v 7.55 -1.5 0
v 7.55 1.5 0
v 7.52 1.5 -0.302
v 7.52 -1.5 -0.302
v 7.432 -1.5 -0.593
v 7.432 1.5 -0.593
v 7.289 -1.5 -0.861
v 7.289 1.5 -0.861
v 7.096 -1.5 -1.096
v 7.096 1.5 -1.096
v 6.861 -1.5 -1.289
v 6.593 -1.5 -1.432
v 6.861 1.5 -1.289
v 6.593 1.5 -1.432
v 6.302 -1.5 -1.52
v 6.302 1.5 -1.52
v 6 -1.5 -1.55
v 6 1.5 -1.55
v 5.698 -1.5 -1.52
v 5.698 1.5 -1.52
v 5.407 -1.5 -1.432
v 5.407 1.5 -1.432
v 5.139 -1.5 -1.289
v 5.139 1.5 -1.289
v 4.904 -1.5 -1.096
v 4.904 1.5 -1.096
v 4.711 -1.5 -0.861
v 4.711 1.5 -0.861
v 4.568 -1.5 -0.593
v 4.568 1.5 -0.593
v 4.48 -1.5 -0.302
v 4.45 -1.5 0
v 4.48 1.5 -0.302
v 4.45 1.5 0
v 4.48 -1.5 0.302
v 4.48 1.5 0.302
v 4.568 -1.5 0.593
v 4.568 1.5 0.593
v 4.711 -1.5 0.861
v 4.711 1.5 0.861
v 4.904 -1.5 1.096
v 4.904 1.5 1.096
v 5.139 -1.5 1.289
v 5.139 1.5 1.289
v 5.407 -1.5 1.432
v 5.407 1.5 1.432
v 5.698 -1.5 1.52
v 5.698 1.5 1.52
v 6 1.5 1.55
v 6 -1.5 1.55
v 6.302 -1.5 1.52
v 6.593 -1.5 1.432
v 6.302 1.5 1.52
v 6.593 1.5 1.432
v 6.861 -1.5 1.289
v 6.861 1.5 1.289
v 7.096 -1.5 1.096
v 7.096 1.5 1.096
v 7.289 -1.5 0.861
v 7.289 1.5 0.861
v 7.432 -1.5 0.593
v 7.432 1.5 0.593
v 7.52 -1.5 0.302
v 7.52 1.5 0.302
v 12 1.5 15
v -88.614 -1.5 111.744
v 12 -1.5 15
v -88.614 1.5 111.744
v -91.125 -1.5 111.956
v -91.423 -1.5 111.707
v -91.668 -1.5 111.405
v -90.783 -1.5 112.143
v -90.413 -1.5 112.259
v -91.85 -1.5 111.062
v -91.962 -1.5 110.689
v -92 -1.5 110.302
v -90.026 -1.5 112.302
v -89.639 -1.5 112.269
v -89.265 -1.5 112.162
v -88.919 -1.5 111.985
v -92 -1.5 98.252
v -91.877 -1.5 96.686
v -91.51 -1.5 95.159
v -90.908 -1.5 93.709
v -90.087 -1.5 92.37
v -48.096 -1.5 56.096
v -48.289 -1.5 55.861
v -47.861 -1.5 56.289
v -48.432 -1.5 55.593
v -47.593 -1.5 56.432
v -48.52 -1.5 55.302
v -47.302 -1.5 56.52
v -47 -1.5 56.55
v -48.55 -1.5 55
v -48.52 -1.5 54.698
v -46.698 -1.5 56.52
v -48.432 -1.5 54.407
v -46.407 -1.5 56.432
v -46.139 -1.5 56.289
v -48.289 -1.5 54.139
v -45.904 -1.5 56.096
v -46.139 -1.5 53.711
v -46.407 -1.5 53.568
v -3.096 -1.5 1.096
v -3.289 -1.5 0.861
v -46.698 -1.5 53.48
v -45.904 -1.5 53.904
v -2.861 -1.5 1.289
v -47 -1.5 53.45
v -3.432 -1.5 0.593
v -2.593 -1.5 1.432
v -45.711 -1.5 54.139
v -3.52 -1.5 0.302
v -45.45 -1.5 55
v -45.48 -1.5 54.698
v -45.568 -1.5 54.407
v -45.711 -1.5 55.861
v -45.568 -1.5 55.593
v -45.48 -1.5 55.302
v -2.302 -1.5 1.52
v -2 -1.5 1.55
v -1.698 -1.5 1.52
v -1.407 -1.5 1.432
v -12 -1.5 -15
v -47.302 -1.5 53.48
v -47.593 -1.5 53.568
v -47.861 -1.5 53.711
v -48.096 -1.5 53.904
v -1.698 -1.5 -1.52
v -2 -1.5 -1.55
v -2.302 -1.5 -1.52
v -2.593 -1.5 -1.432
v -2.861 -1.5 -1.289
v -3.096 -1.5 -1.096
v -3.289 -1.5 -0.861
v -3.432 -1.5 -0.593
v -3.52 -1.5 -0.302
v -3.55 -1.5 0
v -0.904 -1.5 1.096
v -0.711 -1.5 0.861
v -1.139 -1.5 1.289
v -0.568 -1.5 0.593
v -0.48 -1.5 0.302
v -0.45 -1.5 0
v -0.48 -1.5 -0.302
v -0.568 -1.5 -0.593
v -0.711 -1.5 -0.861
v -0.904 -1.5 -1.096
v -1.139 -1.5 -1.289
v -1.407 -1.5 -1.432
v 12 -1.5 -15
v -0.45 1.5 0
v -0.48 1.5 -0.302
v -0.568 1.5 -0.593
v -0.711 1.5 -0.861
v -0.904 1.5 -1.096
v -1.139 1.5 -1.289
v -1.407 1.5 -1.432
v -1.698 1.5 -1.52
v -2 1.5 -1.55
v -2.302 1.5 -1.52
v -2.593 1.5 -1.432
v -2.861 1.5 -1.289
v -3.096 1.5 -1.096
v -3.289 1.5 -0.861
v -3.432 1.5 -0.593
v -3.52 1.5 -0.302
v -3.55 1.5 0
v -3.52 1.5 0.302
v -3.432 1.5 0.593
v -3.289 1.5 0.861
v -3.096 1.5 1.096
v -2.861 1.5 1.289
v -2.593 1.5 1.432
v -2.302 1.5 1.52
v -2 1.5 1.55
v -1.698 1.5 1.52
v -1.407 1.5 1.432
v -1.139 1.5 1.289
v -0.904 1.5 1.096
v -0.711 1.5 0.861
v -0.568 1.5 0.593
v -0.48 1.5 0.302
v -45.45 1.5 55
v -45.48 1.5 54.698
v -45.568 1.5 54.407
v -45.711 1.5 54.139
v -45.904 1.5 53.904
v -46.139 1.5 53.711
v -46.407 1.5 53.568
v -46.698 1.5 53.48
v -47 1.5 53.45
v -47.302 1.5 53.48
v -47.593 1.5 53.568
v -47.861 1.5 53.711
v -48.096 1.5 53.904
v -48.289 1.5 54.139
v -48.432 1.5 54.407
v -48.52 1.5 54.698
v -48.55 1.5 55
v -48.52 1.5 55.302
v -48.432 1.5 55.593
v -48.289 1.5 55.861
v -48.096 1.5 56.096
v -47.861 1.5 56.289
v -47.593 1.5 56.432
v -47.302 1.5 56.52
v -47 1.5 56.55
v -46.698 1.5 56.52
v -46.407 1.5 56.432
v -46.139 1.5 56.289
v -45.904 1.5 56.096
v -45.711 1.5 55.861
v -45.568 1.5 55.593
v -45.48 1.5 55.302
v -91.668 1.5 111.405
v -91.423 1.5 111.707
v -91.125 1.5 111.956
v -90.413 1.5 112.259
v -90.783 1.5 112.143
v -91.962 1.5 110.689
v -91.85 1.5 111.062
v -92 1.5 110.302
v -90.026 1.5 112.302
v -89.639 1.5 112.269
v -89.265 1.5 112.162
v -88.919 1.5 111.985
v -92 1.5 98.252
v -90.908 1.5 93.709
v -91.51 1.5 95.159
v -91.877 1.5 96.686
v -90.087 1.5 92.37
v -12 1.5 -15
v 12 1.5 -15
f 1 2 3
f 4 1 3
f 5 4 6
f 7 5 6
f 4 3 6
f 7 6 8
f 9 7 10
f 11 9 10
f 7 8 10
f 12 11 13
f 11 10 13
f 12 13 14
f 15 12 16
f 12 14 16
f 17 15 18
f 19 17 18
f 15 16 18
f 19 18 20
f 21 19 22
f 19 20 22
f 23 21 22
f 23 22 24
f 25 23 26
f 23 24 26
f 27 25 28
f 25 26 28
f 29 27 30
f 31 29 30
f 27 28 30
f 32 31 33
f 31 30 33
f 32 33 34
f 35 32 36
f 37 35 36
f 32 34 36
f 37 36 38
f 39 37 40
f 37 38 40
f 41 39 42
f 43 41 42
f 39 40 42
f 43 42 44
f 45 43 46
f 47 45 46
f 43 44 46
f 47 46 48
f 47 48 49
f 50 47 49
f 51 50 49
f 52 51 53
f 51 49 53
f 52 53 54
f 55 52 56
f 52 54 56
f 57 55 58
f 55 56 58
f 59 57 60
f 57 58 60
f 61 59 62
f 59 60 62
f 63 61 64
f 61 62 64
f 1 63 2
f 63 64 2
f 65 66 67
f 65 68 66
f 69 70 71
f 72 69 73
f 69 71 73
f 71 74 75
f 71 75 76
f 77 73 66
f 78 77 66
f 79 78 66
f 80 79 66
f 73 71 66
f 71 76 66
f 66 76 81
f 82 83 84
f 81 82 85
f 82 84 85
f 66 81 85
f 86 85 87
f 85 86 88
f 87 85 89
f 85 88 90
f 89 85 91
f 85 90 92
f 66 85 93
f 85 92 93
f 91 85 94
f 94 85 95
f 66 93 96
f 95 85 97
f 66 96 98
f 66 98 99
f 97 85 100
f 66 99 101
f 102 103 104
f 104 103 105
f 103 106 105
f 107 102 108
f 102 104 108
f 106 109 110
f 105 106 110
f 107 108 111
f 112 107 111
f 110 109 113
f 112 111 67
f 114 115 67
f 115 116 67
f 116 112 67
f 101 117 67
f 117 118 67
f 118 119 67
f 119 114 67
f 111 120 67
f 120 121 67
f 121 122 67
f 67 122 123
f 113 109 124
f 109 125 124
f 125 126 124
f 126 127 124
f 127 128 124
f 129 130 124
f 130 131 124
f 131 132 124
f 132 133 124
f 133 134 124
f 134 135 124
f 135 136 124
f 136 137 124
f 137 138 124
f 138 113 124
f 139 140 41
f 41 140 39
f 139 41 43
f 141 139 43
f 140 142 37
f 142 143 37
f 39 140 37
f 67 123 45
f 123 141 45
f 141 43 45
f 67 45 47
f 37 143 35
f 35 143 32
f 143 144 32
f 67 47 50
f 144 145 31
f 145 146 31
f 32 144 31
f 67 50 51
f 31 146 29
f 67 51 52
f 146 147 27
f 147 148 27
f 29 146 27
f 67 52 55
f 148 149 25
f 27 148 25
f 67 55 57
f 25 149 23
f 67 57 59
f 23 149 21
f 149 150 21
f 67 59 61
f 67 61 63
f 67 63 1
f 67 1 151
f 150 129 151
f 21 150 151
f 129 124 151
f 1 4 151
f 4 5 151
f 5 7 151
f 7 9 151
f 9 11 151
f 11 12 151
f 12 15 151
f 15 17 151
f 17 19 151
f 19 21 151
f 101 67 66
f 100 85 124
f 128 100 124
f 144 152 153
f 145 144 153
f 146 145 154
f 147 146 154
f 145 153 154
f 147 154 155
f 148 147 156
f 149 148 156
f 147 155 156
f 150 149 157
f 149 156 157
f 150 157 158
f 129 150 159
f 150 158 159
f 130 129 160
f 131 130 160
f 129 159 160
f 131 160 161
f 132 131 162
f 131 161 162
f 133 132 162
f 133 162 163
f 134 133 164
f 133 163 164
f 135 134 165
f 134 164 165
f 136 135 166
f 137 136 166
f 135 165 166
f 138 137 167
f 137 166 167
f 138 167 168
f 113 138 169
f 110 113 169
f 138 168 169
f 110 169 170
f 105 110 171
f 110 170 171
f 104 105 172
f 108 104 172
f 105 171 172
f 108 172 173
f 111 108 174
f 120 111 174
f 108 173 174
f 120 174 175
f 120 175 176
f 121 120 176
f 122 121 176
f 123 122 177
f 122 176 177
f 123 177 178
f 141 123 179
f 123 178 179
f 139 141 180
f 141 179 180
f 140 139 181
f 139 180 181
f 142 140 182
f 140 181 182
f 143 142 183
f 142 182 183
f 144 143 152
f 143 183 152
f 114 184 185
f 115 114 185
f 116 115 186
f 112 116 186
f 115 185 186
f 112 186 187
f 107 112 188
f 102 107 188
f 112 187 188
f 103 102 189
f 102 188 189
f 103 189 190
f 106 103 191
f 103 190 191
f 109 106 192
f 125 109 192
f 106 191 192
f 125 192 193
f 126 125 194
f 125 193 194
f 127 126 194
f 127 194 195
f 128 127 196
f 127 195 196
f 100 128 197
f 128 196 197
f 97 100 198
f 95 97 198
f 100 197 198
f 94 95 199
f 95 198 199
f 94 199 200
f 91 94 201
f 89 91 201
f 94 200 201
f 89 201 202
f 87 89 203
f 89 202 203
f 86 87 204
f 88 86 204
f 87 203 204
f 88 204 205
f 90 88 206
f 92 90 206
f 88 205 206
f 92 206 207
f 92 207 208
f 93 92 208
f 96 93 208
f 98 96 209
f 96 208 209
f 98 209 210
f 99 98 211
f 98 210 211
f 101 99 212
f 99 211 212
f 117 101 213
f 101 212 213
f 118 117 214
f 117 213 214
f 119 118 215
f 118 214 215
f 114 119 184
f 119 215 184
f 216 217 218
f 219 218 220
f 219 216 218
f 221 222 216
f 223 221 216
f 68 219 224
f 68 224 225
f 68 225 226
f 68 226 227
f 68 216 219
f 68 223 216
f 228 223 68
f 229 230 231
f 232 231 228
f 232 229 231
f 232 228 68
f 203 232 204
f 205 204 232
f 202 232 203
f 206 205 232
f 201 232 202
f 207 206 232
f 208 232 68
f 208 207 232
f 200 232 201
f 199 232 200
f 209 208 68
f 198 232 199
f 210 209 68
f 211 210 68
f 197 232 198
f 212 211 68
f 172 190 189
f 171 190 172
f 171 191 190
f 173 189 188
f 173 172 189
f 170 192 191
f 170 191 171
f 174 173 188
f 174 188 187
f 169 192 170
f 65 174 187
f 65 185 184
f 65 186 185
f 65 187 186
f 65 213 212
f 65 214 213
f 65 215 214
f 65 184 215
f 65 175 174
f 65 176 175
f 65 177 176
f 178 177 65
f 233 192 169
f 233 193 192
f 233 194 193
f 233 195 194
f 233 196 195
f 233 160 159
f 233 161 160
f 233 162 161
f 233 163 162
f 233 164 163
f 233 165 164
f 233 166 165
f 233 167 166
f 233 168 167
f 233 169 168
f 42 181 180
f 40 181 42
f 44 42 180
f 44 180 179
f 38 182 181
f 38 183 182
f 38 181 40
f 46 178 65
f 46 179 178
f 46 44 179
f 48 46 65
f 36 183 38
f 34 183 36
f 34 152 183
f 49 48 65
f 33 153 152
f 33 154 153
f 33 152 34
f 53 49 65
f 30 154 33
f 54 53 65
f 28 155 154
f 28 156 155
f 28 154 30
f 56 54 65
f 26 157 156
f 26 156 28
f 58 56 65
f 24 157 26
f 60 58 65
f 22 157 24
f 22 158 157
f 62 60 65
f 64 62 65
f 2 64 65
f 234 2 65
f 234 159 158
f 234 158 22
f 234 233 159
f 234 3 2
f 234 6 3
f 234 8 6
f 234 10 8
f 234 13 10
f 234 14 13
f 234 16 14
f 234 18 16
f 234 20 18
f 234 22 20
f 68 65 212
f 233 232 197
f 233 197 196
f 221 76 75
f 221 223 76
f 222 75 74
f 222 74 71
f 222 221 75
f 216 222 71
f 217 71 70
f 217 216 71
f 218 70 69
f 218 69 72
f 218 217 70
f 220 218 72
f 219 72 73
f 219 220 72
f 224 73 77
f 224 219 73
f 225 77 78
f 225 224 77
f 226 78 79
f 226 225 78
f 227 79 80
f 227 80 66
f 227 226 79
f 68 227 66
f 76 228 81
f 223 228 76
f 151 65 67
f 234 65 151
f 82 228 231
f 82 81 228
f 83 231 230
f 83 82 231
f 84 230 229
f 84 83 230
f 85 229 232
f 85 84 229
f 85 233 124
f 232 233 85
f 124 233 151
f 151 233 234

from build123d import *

# Parameters (mm, degrees)
SKETCH1_W           = 24
SKETCH1_H           = 30
BOSS_EXTRUDE1_DEPTH = 1.5
SKETCH2_R           = 1.55
CUT_EXTRUDE1_DEPTH  = 3
FILLET1_R           = 10
FILLET2_R           = 2


with BuildPart() as part:
    # Sketch1 → Boss-Extrude1 (new body, symmetric)
    with BuildSketch(Plane(origin=(0, 0, 0), x_dir=(1, 0, 0), z_dir=(0, 1, 0))):
        Polygon((-92, -95), (-92, -115), (12, -15), (-12, -15), (-12, 15), align=None)
        Rectangle(SKETCH1_W, SKETCH1_H)
    extrude(amount=BOSS_EXTRUDE1_DEPTH, both=True)

    # Sketch2 → Cut-Extrude1 (cut)
    with BuildSketch(Plane(origin=(0, 1.5, 0), x_dir=(1, 0, 0), z_dir=(0, 1, 0))):
        with Locations((6, 0)):
            Circle(SKETCH2_R)
        with Locations((-2, 0)):
            Circle(SKETCH2_R)
        with Locations((-47, -55)):
            Circle(SKETCH2_R)
    extrude(amount=-CUT_EXTRUDE1_DEPTH, mode=Mode.SUBTRACT)

    # Fillet1
    fillet1_edges = [part.edges().sort_by_distance(p)[0] for p in [
        (-92, 0, 95),
    ]]
    fillet(fillet1_edges, radius=FILLET1_R)

    # Fillet2
    fillet2_edges = [part.edges().sort_by_distance(p)[0] for p in [
        (-92, 0, 115),
    ]]
    fillet(fillet2_edges, radius=FILLET2_R)


solid = part.part
